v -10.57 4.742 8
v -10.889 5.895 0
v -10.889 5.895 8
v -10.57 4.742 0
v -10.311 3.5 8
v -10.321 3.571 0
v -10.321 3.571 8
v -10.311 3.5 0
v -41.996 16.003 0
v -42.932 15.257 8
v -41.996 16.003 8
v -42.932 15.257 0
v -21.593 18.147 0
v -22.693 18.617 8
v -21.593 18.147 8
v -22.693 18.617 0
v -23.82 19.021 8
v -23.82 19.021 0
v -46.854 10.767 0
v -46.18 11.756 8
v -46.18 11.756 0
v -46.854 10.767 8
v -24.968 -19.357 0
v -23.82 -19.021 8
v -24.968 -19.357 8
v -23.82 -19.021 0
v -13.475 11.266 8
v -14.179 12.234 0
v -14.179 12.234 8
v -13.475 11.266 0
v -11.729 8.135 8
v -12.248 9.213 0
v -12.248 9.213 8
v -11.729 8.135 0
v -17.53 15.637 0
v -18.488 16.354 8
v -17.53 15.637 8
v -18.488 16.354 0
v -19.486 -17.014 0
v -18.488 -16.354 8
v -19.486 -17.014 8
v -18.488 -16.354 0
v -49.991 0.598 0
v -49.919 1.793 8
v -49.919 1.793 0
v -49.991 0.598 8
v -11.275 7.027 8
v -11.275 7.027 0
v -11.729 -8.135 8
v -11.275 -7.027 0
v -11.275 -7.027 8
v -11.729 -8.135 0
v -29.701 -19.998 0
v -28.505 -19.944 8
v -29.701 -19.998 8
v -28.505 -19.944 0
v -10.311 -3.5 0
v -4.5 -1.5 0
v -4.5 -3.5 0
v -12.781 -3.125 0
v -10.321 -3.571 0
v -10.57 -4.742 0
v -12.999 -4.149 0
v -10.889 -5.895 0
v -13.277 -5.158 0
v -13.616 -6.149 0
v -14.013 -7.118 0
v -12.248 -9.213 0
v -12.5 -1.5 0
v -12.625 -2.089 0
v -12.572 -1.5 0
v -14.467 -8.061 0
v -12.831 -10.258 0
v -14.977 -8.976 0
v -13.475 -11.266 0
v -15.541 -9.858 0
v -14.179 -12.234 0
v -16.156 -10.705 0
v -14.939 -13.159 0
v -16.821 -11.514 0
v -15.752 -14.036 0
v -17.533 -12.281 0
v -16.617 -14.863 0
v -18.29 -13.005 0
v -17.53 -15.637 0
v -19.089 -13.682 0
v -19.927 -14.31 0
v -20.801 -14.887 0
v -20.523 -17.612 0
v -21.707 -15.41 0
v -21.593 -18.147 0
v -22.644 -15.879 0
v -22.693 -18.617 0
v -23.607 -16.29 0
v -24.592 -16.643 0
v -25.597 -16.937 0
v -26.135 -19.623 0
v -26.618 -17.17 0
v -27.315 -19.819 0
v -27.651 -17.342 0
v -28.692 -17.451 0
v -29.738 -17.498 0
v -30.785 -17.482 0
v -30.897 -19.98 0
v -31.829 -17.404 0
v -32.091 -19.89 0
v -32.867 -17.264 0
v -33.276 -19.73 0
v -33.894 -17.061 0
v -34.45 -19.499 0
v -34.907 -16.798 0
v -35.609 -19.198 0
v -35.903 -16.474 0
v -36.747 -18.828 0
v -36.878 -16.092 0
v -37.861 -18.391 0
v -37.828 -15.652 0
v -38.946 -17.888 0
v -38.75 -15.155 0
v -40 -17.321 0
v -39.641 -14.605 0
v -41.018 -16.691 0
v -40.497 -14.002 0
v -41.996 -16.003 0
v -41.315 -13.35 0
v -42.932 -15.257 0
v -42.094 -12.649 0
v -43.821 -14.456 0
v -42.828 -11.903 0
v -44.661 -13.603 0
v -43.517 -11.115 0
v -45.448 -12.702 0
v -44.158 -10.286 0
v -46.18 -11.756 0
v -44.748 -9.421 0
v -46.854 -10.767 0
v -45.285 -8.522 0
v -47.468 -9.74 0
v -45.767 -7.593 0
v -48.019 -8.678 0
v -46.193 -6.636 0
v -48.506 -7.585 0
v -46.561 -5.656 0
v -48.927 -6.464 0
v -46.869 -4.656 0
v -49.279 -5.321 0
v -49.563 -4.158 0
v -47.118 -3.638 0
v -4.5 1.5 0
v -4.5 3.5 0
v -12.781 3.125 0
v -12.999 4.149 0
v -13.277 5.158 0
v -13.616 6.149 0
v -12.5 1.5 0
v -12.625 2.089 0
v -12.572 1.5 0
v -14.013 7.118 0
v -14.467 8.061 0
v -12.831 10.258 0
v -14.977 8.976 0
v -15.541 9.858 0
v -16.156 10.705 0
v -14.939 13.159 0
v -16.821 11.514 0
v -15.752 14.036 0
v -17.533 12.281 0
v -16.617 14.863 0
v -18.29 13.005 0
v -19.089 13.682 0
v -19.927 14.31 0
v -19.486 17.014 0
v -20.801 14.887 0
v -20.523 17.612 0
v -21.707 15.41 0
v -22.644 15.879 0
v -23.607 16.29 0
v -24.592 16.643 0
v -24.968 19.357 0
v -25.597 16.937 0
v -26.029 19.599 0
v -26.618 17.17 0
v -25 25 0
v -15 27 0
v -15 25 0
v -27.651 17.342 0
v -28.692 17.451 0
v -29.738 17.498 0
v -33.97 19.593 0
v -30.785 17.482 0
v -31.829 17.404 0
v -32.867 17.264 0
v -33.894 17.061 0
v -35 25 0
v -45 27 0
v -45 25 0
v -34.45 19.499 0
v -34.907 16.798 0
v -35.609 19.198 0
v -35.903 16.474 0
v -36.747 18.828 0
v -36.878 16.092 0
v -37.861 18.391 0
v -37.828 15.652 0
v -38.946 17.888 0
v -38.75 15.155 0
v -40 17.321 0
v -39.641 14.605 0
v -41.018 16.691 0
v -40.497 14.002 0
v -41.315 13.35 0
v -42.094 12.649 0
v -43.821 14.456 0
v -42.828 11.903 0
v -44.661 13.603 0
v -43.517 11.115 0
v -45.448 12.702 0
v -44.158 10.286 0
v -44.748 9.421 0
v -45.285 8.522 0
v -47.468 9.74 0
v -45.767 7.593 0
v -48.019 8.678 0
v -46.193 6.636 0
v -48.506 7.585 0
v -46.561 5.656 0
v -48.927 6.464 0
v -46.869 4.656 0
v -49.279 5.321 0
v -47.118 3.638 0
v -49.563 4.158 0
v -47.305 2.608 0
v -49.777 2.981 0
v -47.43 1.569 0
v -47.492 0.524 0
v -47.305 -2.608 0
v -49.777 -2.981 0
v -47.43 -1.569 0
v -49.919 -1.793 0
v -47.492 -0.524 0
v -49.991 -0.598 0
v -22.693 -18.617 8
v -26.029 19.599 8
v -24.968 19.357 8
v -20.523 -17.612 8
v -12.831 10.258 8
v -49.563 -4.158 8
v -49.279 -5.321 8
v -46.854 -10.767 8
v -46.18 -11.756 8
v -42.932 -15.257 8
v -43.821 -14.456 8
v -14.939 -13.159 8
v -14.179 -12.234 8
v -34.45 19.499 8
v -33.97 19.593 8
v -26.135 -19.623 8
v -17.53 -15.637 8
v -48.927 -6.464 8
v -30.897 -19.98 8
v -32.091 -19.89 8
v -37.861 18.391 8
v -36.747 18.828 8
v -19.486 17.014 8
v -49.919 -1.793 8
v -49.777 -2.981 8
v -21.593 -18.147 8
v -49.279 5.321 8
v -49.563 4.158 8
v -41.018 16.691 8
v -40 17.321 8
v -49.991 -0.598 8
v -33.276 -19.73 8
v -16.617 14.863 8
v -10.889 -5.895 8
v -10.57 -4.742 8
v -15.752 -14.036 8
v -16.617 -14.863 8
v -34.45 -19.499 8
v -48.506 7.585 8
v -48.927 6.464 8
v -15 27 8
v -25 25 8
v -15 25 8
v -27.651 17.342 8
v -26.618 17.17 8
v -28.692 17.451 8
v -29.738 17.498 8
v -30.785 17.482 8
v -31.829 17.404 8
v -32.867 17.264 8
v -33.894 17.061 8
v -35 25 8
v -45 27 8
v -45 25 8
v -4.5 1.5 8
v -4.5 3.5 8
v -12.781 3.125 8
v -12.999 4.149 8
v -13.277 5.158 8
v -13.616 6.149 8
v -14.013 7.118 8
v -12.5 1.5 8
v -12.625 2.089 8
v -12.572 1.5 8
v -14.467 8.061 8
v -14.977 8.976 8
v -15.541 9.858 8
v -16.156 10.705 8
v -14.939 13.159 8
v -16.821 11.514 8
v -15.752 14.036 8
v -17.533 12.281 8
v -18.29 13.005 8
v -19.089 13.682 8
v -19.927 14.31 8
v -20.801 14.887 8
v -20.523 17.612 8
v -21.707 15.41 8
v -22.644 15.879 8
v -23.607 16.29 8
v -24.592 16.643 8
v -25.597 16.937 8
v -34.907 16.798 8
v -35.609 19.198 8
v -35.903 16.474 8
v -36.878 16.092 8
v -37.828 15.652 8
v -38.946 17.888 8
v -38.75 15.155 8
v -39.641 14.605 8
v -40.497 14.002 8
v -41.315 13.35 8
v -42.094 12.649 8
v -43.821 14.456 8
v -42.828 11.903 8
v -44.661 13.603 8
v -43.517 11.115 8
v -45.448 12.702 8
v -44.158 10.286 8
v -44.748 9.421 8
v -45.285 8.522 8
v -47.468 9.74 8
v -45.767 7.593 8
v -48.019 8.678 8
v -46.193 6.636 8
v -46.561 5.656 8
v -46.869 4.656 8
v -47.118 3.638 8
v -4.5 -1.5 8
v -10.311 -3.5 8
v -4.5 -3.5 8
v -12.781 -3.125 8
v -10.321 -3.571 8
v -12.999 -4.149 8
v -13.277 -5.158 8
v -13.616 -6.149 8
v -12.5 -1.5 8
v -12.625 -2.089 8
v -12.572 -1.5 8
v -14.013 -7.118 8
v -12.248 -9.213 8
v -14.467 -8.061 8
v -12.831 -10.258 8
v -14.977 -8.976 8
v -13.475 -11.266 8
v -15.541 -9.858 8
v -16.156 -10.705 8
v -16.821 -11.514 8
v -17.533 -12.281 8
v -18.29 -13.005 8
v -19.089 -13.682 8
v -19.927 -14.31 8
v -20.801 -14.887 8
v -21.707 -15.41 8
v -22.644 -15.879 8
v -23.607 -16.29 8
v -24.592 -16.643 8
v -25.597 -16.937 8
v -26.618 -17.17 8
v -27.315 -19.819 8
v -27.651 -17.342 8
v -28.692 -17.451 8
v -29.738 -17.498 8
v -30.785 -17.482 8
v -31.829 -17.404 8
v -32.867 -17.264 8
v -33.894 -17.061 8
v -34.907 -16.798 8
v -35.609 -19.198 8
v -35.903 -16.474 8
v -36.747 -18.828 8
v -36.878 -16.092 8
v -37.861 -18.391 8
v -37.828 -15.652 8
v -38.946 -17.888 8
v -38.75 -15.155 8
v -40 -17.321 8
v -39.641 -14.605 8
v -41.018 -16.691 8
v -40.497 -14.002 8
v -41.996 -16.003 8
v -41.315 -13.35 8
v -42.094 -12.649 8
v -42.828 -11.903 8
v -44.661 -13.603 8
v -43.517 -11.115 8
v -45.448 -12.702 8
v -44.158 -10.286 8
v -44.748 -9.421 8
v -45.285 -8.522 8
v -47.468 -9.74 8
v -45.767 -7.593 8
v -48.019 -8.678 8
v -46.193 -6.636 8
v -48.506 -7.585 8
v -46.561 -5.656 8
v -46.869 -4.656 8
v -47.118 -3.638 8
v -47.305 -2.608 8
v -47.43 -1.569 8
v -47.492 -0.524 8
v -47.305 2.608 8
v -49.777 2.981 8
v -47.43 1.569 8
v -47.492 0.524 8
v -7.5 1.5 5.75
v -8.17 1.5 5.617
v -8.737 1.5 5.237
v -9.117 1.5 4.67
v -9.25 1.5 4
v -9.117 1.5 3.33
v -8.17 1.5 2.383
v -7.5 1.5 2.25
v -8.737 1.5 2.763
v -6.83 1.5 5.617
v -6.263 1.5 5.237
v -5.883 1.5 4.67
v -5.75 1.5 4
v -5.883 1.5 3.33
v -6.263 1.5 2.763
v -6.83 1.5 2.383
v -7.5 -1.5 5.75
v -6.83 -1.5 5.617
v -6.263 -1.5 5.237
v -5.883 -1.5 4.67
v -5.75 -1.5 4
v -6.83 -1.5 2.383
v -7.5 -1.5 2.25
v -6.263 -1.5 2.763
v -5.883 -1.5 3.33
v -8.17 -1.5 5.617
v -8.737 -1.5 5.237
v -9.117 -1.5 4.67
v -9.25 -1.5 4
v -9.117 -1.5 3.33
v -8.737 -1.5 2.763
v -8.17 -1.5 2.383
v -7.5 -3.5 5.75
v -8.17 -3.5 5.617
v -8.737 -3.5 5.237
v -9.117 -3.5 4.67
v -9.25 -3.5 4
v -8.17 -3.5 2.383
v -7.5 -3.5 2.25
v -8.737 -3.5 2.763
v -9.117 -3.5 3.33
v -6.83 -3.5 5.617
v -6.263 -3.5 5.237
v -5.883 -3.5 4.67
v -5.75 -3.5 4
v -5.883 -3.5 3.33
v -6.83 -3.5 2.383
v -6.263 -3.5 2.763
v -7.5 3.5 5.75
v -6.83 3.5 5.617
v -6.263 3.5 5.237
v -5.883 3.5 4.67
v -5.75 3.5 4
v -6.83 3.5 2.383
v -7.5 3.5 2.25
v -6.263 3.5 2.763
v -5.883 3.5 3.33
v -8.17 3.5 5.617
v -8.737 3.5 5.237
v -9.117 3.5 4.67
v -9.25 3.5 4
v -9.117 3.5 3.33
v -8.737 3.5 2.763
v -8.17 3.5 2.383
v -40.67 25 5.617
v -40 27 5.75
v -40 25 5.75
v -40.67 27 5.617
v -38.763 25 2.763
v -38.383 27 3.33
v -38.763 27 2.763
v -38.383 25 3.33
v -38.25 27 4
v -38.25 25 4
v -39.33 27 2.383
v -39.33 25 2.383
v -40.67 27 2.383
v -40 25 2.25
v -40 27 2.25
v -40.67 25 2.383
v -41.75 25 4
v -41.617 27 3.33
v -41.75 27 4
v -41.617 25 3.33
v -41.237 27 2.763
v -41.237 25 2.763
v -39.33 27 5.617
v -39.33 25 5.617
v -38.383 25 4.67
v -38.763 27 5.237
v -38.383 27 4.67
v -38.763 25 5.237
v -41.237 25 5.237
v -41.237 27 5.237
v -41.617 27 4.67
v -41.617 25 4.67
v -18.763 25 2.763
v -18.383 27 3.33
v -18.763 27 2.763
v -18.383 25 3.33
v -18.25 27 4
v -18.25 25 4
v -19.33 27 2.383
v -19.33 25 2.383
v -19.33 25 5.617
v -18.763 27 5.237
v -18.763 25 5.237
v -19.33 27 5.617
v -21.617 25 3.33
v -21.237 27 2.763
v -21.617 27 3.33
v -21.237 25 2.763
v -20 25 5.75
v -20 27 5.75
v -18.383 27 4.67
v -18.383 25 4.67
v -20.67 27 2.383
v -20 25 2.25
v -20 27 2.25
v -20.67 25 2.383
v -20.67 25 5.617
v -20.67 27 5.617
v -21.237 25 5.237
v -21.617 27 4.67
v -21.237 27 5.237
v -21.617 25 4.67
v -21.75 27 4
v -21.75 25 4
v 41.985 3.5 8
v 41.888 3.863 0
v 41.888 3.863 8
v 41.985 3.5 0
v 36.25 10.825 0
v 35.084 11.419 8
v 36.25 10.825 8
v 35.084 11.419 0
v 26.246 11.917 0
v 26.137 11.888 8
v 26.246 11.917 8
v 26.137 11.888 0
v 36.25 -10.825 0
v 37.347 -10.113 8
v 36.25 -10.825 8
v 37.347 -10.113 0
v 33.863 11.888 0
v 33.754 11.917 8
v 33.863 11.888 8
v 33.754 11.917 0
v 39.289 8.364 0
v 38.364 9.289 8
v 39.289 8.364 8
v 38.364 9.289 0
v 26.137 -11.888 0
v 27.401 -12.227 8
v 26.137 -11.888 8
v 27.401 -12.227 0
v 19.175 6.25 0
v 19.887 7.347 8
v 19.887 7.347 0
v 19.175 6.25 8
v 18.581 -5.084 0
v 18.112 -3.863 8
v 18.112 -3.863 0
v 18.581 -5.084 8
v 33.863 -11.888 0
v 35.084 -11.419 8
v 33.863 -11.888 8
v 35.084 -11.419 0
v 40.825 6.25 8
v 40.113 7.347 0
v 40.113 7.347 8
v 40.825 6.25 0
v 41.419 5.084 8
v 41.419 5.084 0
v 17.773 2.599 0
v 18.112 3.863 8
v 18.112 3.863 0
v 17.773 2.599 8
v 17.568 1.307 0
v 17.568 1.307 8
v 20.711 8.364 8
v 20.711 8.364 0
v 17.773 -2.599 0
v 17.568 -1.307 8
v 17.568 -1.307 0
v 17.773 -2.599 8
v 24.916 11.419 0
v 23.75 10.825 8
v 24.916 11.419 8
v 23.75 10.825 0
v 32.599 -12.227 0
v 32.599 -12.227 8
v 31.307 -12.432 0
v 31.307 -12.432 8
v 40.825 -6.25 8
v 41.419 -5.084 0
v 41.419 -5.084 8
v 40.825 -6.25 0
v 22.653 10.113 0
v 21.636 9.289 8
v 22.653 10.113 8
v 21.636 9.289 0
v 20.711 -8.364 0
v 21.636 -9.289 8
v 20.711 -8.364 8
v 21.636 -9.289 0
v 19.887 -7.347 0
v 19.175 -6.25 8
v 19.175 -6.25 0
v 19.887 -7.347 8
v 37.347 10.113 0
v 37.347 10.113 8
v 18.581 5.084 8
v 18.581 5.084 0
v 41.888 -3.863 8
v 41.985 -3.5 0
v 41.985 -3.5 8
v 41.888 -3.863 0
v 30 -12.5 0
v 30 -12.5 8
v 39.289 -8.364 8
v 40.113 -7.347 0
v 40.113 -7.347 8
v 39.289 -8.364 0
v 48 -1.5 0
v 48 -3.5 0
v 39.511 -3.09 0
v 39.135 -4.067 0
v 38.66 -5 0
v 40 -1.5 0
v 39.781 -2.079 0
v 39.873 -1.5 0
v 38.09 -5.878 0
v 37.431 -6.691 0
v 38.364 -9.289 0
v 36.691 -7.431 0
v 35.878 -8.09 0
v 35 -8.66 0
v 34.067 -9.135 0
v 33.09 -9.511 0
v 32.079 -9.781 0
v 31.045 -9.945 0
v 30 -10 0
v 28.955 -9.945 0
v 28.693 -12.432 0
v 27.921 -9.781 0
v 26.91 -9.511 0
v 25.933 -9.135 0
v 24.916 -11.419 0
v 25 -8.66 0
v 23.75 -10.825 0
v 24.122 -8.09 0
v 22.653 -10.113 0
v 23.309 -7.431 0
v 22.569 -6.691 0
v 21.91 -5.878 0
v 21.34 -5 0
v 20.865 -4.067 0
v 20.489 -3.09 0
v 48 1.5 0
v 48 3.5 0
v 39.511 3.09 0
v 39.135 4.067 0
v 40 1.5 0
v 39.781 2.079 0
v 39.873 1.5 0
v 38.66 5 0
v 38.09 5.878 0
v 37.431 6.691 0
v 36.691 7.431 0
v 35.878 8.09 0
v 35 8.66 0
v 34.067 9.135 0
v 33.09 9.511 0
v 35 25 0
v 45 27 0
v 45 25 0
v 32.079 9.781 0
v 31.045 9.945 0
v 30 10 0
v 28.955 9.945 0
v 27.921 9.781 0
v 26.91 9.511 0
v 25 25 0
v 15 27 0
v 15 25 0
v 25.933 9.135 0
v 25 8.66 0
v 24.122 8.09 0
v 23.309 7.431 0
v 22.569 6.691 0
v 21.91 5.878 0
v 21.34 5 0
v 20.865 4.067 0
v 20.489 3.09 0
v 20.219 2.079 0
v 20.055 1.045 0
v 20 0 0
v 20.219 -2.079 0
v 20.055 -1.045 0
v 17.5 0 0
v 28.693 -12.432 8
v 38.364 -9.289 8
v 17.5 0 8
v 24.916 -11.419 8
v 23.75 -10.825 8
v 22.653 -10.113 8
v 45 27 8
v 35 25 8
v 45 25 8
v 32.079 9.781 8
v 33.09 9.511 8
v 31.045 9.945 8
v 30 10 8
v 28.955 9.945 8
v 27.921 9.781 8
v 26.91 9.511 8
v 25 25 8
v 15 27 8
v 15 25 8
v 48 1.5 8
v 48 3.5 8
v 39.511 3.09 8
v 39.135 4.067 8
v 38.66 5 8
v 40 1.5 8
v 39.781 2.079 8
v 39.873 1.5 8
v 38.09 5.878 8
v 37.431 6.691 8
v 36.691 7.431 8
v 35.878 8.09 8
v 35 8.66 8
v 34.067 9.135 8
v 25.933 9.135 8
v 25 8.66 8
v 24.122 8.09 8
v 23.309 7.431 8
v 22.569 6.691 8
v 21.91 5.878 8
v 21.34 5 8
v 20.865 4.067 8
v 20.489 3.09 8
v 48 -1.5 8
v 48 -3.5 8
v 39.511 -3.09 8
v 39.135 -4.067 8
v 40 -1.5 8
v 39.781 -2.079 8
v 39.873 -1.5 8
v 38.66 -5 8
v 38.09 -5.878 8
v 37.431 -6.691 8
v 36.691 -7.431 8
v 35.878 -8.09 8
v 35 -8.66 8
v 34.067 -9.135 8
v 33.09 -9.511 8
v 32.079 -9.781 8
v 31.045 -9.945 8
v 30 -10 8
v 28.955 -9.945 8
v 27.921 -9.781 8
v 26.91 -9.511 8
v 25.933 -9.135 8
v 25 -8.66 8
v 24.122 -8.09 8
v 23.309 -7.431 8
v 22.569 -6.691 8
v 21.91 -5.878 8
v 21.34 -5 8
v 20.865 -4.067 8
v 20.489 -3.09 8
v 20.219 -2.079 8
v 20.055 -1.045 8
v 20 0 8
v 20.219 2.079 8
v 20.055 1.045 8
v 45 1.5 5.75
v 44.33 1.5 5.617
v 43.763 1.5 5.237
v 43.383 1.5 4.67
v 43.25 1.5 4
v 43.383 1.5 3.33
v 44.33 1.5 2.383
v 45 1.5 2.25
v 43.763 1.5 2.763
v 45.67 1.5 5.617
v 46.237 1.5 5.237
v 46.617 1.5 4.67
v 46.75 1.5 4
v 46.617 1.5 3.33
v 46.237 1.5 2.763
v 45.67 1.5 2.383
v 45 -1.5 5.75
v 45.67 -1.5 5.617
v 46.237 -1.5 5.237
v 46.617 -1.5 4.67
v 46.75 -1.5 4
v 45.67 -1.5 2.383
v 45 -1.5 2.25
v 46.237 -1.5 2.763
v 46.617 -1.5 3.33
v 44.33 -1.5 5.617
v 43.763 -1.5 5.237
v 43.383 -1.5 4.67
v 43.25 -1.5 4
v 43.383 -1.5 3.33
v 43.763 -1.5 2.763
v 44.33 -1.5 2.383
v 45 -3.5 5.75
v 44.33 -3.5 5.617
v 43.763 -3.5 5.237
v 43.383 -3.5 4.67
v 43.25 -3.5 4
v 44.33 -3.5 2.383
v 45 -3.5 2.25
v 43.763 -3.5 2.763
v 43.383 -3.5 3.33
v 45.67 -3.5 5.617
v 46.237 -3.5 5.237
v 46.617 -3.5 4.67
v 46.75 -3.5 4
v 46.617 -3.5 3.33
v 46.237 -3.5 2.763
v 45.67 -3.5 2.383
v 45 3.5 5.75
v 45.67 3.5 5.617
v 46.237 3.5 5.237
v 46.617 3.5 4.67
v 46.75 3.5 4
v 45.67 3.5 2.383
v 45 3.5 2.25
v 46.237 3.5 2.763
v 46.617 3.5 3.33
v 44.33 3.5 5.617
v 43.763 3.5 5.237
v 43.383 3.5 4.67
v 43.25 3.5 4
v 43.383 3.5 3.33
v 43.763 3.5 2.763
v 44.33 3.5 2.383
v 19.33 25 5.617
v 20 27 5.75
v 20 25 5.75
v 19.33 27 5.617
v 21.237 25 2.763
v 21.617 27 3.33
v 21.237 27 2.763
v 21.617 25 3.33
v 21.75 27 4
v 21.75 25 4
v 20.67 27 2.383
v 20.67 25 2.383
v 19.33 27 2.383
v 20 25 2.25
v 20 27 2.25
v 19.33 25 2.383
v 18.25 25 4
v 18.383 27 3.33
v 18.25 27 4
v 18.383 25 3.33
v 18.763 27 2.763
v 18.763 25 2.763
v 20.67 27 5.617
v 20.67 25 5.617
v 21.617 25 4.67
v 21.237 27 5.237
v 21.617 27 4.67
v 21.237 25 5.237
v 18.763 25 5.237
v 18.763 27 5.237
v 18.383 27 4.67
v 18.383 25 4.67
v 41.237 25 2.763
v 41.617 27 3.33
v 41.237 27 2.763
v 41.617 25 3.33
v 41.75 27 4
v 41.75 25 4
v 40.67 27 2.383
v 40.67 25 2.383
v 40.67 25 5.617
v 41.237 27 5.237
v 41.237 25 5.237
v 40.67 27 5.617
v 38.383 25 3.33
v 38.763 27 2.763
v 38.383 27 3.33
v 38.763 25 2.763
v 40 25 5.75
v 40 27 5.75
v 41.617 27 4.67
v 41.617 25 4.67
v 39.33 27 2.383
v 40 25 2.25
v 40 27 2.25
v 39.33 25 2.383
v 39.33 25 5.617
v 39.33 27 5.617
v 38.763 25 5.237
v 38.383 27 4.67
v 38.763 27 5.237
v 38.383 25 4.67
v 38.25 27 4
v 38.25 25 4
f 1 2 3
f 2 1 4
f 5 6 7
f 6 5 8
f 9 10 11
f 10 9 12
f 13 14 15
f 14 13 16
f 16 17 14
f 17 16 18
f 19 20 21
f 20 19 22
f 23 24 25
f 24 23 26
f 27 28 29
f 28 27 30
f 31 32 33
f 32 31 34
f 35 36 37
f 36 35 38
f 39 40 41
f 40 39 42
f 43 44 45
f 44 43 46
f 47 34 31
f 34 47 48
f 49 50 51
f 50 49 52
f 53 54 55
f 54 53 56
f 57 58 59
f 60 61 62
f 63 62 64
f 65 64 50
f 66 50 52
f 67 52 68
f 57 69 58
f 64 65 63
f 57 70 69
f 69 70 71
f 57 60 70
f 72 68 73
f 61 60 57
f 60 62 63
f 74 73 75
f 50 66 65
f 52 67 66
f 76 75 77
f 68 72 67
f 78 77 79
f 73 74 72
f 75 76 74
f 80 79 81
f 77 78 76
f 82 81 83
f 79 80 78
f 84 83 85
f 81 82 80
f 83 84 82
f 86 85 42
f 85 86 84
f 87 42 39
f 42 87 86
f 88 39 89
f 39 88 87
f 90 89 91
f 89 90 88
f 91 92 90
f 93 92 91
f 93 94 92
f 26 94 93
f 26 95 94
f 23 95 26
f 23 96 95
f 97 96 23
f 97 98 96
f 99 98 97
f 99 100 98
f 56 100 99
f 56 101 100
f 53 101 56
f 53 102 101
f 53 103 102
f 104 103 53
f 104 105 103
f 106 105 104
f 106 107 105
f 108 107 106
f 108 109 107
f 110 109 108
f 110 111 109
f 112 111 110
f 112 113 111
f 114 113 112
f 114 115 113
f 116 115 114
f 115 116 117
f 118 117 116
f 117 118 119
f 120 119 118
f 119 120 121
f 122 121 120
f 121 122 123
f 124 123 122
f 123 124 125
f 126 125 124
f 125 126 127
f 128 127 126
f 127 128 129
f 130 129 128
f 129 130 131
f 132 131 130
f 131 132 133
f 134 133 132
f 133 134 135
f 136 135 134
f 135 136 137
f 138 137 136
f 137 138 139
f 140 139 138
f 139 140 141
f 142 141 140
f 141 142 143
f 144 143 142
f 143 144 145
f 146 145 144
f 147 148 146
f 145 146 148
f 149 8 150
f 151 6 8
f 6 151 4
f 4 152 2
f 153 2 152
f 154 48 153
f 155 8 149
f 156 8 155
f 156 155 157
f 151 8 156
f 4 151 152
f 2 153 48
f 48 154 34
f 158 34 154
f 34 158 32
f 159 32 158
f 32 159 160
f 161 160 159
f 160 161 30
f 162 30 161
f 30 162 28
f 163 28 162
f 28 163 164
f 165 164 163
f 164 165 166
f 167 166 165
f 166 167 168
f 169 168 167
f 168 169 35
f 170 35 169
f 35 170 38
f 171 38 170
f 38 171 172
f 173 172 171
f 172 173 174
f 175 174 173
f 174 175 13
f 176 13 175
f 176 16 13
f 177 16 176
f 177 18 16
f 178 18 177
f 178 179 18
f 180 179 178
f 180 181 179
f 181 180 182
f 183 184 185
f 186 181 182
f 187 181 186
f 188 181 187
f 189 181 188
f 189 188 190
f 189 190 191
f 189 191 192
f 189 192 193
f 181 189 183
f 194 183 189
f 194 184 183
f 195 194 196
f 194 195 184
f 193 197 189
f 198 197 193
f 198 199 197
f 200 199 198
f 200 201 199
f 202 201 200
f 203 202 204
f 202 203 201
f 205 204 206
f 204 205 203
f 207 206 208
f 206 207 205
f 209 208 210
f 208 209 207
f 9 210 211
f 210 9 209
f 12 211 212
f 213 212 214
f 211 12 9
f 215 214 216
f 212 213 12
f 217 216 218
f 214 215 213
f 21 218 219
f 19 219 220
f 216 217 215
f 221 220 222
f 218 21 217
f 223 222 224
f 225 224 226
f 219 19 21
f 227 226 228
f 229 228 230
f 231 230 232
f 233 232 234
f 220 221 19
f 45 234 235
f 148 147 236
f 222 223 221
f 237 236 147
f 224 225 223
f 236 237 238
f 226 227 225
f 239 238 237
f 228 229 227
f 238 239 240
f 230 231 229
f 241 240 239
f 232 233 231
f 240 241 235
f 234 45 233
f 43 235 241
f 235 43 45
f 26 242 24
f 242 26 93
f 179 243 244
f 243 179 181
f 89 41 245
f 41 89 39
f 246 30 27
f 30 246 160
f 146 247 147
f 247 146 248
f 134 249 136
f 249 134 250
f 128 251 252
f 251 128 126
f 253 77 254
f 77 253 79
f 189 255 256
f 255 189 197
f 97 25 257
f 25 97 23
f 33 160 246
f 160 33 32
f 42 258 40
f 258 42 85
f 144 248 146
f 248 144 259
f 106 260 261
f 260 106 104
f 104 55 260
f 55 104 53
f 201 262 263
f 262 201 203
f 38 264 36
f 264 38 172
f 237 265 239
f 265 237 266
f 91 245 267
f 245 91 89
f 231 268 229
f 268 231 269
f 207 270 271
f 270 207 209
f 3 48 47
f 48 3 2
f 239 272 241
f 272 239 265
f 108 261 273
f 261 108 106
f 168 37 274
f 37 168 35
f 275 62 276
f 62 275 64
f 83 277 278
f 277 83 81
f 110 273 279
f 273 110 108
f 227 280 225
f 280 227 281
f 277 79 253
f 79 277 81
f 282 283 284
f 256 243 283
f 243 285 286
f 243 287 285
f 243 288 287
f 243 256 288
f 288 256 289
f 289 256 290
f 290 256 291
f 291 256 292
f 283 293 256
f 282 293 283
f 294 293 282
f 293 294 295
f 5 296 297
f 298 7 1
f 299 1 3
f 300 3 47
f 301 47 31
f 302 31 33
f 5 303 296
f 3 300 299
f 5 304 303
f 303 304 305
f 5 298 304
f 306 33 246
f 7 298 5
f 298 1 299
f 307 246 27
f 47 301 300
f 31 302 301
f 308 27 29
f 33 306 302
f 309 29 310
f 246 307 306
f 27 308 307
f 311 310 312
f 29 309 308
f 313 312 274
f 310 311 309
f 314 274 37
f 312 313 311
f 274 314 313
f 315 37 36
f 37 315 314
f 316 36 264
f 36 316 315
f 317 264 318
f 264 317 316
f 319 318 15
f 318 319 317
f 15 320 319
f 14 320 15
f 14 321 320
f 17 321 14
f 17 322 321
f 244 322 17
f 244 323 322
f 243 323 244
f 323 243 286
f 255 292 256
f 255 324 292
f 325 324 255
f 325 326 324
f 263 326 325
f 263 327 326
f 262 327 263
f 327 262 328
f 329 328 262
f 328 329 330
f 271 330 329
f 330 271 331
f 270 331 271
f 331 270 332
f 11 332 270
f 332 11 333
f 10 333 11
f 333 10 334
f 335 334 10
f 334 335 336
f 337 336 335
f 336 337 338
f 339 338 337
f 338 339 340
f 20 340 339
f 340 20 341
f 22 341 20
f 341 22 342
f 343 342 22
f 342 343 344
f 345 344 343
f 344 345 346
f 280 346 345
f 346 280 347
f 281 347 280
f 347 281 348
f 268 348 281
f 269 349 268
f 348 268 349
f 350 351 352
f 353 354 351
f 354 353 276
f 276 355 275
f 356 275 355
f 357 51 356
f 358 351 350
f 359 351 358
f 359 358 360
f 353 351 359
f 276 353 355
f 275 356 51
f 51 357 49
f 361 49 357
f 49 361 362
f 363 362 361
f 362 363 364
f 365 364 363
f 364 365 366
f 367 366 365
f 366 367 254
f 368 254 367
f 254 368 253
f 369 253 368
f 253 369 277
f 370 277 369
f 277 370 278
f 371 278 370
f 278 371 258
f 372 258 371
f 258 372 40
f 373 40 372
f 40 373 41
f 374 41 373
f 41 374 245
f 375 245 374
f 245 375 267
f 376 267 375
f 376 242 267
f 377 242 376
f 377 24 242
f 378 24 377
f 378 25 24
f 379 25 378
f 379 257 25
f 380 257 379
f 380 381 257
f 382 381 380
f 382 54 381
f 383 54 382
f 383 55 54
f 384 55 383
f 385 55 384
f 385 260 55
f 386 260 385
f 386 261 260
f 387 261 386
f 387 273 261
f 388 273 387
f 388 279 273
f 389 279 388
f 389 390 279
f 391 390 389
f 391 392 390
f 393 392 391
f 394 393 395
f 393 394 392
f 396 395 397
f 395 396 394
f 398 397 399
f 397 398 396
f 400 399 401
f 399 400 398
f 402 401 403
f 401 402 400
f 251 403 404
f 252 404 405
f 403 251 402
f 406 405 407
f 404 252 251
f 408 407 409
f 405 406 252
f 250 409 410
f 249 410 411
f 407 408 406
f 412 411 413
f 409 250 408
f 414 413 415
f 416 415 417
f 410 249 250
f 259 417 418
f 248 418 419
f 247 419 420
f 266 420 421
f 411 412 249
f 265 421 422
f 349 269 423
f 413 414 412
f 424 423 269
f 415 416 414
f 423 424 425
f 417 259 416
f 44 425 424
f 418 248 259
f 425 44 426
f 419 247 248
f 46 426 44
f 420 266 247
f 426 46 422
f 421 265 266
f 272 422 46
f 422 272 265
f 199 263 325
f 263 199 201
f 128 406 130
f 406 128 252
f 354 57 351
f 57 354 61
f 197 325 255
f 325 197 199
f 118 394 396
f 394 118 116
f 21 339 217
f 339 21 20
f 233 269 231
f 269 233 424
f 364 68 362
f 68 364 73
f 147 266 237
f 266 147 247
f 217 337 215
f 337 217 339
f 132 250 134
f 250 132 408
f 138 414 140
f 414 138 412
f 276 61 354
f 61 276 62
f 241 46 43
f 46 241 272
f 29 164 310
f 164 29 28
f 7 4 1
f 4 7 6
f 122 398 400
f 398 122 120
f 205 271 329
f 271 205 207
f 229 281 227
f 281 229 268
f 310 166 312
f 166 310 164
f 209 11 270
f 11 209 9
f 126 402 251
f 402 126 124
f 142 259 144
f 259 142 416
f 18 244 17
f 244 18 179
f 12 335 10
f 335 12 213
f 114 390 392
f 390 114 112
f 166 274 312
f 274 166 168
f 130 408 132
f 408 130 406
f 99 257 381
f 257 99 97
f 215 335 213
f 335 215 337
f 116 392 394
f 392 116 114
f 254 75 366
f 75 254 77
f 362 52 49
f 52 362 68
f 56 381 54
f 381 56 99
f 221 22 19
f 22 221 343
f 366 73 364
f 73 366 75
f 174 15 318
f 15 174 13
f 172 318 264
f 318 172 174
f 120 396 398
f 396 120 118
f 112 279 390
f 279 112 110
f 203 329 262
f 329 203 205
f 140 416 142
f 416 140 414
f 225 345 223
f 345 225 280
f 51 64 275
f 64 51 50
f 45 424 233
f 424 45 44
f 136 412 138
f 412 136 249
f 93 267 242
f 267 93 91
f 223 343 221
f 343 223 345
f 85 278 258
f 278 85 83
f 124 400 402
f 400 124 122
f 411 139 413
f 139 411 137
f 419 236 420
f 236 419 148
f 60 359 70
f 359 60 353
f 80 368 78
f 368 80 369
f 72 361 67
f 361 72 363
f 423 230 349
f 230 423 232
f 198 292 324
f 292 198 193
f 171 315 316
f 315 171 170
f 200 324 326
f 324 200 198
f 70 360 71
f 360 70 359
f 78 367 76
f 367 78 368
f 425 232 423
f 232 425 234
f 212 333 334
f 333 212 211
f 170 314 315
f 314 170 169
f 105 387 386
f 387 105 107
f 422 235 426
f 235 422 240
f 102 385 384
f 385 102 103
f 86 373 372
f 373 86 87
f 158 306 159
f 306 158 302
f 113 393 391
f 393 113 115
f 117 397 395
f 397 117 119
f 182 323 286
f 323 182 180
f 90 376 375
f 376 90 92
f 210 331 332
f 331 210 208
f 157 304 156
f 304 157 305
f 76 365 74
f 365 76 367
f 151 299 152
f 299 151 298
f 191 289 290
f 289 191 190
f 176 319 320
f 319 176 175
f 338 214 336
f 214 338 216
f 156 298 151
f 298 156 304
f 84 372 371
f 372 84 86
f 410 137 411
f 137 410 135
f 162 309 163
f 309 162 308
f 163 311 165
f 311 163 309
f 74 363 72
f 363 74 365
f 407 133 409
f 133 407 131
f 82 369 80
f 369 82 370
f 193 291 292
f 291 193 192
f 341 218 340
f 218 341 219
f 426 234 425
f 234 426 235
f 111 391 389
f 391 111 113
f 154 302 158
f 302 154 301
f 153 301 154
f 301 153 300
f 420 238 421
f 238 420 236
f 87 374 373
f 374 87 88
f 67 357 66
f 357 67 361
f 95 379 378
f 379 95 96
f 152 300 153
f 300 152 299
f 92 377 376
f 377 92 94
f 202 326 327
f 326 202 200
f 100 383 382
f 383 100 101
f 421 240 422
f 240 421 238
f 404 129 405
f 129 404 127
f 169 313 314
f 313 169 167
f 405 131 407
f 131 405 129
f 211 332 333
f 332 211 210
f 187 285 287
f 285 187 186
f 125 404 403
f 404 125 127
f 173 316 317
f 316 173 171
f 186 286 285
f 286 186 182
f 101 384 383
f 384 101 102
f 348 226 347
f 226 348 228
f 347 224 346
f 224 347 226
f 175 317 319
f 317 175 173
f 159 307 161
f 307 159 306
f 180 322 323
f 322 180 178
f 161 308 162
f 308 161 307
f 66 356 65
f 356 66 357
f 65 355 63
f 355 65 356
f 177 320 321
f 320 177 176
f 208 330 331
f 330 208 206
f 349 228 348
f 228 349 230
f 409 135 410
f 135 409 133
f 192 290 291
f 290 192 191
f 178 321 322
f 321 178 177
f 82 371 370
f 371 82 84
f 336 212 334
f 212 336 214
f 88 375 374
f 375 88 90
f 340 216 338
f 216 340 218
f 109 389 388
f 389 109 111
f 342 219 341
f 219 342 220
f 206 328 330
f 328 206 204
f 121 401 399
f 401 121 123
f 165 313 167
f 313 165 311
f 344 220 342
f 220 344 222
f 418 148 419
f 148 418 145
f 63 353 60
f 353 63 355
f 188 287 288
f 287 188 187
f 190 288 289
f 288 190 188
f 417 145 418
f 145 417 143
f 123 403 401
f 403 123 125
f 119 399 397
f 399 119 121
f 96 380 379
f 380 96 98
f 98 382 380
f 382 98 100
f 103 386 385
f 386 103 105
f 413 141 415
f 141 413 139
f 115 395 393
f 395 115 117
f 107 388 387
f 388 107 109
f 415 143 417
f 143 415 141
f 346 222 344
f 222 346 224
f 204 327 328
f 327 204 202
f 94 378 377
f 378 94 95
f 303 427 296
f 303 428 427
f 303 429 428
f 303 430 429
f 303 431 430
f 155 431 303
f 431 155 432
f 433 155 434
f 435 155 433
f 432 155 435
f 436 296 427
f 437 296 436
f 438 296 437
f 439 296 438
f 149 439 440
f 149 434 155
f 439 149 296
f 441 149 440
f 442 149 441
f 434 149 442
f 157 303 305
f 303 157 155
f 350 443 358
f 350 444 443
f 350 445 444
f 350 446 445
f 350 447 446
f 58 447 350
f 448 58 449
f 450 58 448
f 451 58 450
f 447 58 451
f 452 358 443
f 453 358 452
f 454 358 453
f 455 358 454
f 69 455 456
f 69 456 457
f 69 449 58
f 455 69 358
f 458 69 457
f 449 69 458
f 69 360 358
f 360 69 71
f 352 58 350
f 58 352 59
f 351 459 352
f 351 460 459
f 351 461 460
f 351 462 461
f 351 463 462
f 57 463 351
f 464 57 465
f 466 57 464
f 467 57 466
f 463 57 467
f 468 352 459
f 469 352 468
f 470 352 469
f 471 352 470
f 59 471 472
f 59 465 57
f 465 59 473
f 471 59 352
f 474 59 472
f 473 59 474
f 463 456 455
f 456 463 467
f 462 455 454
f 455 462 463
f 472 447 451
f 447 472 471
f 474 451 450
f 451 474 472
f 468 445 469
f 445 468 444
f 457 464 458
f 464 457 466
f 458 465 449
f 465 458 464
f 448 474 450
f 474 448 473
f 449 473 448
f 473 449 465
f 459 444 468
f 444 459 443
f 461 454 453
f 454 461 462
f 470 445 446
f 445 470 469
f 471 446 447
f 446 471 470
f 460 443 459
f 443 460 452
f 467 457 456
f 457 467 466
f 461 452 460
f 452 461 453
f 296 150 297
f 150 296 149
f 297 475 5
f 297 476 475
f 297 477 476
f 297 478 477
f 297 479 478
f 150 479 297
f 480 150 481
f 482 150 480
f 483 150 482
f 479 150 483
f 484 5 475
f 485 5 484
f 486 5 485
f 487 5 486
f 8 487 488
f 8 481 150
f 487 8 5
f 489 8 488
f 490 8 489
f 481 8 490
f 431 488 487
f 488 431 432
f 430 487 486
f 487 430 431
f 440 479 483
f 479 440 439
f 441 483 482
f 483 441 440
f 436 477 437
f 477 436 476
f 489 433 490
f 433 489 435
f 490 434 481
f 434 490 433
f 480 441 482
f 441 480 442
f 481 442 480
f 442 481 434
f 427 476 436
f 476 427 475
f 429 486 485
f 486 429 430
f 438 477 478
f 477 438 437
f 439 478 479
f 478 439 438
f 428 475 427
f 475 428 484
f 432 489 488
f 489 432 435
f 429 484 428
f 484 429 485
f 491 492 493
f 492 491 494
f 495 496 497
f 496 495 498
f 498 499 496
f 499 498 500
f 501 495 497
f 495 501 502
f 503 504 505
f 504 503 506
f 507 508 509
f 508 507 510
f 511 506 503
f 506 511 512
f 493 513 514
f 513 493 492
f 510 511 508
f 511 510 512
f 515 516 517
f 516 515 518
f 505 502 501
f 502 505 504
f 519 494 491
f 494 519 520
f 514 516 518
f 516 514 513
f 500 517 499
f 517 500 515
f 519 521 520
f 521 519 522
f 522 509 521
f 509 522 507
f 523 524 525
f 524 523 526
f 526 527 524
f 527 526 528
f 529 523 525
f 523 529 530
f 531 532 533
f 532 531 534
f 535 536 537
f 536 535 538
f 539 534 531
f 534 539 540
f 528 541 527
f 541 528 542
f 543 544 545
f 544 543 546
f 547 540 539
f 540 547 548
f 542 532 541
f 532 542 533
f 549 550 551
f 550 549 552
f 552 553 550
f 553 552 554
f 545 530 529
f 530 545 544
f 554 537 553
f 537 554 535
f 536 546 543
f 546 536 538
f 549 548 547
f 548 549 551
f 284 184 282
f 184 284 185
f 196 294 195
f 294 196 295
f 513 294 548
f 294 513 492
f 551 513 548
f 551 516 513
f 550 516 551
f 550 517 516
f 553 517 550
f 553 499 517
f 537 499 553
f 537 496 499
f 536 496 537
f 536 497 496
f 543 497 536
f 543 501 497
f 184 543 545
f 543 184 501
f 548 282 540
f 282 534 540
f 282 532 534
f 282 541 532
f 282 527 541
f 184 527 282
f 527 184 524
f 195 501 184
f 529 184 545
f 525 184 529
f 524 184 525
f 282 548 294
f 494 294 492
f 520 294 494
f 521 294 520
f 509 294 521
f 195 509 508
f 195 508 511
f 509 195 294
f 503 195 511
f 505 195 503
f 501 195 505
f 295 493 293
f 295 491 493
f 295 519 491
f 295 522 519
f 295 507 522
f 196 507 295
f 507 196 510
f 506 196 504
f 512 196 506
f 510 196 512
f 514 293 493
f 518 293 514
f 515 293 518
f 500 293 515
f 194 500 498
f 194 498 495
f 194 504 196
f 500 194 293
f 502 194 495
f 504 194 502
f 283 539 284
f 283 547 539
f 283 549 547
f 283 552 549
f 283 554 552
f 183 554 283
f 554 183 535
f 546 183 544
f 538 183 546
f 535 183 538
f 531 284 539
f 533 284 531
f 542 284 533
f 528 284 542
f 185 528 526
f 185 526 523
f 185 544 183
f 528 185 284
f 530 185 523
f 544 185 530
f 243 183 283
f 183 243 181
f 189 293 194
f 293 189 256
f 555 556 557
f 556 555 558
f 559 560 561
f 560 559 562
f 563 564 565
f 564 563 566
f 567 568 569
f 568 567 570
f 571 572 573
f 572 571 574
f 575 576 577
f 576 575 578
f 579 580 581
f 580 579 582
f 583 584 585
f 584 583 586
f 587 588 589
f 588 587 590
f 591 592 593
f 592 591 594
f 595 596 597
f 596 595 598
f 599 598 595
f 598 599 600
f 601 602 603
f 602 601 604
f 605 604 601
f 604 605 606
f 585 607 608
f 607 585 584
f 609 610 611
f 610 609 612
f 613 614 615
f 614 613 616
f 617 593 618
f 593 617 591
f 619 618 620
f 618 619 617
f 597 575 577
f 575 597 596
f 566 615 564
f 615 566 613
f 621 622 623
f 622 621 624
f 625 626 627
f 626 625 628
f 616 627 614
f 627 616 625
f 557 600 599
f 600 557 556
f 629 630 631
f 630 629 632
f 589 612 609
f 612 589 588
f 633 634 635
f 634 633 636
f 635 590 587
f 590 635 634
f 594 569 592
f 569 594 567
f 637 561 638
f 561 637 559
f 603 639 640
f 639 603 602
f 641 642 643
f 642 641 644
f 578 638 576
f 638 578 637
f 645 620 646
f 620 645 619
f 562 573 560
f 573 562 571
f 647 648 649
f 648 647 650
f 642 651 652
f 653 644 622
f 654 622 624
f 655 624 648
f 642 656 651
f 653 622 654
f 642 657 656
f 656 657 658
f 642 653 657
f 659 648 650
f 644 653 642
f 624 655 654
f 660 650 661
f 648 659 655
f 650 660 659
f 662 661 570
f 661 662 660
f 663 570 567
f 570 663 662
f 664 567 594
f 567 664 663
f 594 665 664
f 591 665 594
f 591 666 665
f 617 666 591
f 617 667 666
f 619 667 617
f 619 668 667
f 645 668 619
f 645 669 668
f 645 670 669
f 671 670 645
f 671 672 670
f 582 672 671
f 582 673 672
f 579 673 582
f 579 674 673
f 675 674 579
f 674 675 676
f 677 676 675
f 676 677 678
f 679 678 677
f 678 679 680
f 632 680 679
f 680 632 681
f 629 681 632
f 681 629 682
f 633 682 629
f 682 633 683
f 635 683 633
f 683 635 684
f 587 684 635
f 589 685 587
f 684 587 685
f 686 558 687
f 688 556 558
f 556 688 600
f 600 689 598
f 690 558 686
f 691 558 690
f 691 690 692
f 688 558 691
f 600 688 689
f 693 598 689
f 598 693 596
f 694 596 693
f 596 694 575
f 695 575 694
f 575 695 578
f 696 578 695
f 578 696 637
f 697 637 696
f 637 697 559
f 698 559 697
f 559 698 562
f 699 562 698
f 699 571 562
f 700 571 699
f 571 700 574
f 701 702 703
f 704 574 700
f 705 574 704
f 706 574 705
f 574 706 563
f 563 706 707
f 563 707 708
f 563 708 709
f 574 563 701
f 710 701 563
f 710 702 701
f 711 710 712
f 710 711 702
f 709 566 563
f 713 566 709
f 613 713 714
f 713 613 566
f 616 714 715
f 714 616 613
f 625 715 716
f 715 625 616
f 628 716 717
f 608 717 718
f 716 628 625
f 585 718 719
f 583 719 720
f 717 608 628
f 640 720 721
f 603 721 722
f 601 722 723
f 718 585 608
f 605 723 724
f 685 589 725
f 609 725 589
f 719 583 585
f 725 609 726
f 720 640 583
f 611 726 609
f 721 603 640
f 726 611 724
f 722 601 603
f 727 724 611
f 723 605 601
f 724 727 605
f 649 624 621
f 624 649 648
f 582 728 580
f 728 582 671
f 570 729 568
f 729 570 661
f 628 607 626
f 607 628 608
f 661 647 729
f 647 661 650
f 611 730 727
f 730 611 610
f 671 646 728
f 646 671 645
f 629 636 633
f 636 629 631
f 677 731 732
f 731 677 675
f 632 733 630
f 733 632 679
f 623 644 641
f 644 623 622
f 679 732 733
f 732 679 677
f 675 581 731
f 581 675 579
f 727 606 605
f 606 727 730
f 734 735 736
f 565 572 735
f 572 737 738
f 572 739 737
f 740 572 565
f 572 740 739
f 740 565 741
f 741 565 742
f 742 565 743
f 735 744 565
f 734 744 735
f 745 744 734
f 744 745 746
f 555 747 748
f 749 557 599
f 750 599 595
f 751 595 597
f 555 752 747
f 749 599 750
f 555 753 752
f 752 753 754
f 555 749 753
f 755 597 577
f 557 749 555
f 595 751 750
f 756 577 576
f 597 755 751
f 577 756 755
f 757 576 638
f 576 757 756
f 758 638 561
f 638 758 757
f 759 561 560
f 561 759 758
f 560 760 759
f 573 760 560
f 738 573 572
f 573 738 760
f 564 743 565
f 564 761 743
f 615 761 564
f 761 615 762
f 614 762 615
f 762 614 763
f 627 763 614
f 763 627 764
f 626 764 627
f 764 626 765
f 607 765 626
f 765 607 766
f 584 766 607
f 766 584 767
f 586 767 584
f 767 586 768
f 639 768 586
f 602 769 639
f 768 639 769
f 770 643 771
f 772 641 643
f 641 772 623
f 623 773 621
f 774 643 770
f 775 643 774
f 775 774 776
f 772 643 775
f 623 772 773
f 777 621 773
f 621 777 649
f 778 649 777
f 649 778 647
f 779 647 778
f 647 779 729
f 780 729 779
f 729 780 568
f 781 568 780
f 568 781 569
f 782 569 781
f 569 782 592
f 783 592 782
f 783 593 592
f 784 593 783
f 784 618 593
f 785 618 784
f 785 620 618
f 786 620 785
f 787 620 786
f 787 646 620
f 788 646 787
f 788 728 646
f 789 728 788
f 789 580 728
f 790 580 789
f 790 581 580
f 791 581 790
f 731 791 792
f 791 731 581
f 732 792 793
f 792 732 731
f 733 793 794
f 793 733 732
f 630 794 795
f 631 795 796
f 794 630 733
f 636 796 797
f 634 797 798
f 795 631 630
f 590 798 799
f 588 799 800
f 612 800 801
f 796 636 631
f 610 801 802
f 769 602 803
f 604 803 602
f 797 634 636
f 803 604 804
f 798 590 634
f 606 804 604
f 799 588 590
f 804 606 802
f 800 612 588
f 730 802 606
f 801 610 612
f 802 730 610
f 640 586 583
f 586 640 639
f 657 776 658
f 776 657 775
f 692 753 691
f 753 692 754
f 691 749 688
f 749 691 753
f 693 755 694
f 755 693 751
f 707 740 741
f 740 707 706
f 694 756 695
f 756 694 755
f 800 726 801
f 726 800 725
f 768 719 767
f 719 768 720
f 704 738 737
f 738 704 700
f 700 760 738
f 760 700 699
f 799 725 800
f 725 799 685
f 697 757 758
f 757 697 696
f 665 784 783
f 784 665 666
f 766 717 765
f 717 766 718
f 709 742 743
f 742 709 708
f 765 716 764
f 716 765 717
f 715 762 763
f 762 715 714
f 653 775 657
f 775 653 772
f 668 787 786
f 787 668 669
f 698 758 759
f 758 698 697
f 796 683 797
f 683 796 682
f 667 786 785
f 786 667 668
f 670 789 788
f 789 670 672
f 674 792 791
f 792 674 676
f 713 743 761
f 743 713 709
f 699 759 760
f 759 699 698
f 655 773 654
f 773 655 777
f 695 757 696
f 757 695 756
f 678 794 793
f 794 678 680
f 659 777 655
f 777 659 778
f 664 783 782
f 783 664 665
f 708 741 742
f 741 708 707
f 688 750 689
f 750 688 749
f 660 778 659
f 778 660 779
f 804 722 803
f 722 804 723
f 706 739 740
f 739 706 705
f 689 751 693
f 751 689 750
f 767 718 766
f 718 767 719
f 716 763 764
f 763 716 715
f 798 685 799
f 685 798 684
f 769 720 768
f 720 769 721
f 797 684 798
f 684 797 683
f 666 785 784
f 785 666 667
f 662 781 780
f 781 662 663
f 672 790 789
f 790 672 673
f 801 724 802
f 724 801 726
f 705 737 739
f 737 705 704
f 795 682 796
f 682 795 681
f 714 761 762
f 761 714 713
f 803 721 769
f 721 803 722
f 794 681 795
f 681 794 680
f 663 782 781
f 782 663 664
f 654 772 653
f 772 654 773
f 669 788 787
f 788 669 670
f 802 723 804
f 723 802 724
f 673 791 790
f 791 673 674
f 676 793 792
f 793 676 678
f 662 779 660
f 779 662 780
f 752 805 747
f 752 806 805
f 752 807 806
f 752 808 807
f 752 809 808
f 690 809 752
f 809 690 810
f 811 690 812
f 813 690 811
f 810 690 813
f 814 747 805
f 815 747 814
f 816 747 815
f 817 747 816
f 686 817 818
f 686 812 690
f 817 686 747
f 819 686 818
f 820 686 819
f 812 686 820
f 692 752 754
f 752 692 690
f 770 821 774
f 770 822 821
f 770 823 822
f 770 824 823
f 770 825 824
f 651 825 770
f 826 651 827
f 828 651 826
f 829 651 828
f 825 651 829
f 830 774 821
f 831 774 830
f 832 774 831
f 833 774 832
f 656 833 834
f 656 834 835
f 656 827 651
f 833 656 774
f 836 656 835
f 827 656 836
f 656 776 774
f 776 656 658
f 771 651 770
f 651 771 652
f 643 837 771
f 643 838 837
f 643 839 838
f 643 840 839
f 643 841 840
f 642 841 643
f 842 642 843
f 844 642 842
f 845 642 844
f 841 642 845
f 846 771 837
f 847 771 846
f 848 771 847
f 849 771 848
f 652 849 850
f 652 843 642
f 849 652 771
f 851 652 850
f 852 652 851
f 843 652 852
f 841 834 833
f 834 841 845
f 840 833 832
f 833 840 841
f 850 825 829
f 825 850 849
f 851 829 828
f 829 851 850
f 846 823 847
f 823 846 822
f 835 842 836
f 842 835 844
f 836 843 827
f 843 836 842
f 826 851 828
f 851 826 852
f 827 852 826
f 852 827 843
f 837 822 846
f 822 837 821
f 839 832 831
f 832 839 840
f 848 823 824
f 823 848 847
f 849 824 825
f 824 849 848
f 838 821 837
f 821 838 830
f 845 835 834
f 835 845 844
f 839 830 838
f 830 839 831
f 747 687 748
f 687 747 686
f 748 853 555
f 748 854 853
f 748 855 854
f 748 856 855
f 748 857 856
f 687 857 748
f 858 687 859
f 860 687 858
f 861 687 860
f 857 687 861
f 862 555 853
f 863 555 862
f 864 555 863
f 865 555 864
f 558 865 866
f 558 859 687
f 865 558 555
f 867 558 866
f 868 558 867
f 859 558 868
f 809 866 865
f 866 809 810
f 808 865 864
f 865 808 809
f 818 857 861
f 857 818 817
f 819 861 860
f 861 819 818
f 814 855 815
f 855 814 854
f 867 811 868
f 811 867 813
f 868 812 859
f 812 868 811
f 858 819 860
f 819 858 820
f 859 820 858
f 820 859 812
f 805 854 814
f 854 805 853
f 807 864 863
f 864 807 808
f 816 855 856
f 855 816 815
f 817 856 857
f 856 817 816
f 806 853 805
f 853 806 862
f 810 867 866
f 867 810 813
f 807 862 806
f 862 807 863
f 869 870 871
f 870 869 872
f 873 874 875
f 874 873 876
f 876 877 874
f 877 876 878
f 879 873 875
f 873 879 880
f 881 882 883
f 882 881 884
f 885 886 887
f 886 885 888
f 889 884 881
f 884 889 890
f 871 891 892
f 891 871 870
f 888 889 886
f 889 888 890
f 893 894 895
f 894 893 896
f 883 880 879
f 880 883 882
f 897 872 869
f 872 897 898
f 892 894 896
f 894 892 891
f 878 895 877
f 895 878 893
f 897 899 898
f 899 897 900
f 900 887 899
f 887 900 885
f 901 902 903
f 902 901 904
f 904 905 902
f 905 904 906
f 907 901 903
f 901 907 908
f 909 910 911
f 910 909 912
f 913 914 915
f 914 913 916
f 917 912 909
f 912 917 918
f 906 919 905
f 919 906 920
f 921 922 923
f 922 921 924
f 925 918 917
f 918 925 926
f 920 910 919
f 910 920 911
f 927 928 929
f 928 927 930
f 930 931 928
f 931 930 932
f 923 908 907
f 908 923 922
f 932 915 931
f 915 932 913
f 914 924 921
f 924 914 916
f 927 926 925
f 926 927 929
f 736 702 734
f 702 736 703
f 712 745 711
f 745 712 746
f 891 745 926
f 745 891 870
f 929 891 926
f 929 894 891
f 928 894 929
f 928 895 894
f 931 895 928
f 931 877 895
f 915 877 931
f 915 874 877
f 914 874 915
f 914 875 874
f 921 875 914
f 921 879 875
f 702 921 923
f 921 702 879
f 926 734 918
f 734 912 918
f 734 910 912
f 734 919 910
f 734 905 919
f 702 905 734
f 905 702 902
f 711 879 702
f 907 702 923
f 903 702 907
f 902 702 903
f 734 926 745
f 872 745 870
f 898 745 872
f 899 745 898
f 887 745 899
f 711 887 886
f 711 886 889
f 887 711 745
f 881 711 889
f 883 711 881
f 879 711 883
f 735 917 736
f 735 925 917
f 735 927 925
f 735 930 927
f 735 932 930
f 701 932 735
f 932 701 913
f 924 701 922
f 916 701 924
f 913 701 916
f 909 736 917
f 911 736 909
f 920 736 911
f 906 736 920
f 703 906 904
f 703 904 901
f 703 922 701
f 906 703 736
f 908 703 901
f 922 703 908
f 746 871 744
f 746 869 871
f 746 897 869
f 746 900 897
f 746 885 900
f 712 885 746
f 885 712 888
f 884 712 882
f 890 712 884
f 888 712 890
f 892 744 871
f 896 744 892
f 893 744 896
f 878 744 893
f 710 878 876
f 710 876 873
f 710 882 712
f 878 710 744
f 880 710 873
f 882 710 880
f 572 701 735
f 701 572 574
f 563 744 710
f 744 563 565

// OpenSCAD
/* [base] */
//between drill axis and  mount pad
distance = 25;
//inner collar
diameter_upper = 35; 
//inner collar
diameter_bottom = 20; 

/* [additional] */
//collar thickness
holder_thickness = 2.5;
//overall size
holder_height = 8;

/* [mounts]*/
pad_width = 30;
pad_thickness = 2;
hole_distance = 20;
hole_diameter = 3.5;

/* [hidden]*/

if(diameter_upper)
  translate([-30,0,0])
    holder(diameter_upper);
if(diameter_bottom)
  translate([30,0,0])
    holder(diameter_bottom);

module holder(diameter,dist=3){
  difference(){
    pipe(diameter+2*holder_thickness,diameter,holder_height,$fn=diameter*3);
    translate([0,-dist/2,-.1])cube([diameter,dist,holder_height+.2]);
  }
  for(i=[1,0])
    mirror([0,i,0])
      translate([diameter/2,dist/2,0])
        difference(){
          cube([8,2,holder_height]);
          translate([5,-.1,holder_height/2])
            rotate([-90,0,0])
              cylinder(d=hole_diameter,$fn=16,h=pad_thickness+.2);
        }
  translate([0,distance,0]){
    difference(){
      translate([-pad_width/2,0,0])
        cube([pad_width,pad_thickness,holder_height]);
      for (i=[-1,1])
        translate([i*hole_distance/2,-.1,holder_height/2])
          rotate([-90,0,0])
            cylinder(d=hole_diameter,$fn=16,h=pad_thickness+.2);
    }
  
  translate([0,0,holder_height/2])
  rotate([90,0,0])
  trapezoid([hole_distance/2,holder_height,distance-diameter/2],[hole_distance/2.8,holder_height]);
  }
}

module pipe(do,di,h,fi=[0,0],fo=[0,0]){
  vis=.01;
  difference(){
    intersection(){
      cylinder(d=do,h=h);
      if(fo[0])
        cylinder(d1=do-fo[0]*2,d2=do-fo[0]*2+2*h,h=h);
      if(fo[1])
        cylinder(d2=do-fo[1]*2,d1=do-fo[1]*2+2*h,h=h);
    }
    if(di)
      translate([0,0,-vis]){
        cylinder(d=di,h=h+2*vis);
        if (fi[0])
          cylinder(d1=di+fi[0]*2,d2=di,h=fi[0]);
        if (fi[1])
          translate([0,0,h-fi[1]+2*vis])
            cylinder(d1=di,d2=di+fi[1]*2,h=fi[1]); //flange top
      }
  }
}
module trapezoid(s=[2,2,2],t=[1,1]){
  translate([-s[0]/2,-s[1]/2,0])
  intersection(){
    hull(){
      translate([0,0,-1])cube([s[0],s[1],1]);
      assign(x=t[0]?t[0]:s[0],y=t[1]?t[1]:s[1])
      translate([(s[0]-x)/2,(s[1]-y)/2,s[2]-1])cube([x,y,1]);
    }
    cube(s);
  }
}
